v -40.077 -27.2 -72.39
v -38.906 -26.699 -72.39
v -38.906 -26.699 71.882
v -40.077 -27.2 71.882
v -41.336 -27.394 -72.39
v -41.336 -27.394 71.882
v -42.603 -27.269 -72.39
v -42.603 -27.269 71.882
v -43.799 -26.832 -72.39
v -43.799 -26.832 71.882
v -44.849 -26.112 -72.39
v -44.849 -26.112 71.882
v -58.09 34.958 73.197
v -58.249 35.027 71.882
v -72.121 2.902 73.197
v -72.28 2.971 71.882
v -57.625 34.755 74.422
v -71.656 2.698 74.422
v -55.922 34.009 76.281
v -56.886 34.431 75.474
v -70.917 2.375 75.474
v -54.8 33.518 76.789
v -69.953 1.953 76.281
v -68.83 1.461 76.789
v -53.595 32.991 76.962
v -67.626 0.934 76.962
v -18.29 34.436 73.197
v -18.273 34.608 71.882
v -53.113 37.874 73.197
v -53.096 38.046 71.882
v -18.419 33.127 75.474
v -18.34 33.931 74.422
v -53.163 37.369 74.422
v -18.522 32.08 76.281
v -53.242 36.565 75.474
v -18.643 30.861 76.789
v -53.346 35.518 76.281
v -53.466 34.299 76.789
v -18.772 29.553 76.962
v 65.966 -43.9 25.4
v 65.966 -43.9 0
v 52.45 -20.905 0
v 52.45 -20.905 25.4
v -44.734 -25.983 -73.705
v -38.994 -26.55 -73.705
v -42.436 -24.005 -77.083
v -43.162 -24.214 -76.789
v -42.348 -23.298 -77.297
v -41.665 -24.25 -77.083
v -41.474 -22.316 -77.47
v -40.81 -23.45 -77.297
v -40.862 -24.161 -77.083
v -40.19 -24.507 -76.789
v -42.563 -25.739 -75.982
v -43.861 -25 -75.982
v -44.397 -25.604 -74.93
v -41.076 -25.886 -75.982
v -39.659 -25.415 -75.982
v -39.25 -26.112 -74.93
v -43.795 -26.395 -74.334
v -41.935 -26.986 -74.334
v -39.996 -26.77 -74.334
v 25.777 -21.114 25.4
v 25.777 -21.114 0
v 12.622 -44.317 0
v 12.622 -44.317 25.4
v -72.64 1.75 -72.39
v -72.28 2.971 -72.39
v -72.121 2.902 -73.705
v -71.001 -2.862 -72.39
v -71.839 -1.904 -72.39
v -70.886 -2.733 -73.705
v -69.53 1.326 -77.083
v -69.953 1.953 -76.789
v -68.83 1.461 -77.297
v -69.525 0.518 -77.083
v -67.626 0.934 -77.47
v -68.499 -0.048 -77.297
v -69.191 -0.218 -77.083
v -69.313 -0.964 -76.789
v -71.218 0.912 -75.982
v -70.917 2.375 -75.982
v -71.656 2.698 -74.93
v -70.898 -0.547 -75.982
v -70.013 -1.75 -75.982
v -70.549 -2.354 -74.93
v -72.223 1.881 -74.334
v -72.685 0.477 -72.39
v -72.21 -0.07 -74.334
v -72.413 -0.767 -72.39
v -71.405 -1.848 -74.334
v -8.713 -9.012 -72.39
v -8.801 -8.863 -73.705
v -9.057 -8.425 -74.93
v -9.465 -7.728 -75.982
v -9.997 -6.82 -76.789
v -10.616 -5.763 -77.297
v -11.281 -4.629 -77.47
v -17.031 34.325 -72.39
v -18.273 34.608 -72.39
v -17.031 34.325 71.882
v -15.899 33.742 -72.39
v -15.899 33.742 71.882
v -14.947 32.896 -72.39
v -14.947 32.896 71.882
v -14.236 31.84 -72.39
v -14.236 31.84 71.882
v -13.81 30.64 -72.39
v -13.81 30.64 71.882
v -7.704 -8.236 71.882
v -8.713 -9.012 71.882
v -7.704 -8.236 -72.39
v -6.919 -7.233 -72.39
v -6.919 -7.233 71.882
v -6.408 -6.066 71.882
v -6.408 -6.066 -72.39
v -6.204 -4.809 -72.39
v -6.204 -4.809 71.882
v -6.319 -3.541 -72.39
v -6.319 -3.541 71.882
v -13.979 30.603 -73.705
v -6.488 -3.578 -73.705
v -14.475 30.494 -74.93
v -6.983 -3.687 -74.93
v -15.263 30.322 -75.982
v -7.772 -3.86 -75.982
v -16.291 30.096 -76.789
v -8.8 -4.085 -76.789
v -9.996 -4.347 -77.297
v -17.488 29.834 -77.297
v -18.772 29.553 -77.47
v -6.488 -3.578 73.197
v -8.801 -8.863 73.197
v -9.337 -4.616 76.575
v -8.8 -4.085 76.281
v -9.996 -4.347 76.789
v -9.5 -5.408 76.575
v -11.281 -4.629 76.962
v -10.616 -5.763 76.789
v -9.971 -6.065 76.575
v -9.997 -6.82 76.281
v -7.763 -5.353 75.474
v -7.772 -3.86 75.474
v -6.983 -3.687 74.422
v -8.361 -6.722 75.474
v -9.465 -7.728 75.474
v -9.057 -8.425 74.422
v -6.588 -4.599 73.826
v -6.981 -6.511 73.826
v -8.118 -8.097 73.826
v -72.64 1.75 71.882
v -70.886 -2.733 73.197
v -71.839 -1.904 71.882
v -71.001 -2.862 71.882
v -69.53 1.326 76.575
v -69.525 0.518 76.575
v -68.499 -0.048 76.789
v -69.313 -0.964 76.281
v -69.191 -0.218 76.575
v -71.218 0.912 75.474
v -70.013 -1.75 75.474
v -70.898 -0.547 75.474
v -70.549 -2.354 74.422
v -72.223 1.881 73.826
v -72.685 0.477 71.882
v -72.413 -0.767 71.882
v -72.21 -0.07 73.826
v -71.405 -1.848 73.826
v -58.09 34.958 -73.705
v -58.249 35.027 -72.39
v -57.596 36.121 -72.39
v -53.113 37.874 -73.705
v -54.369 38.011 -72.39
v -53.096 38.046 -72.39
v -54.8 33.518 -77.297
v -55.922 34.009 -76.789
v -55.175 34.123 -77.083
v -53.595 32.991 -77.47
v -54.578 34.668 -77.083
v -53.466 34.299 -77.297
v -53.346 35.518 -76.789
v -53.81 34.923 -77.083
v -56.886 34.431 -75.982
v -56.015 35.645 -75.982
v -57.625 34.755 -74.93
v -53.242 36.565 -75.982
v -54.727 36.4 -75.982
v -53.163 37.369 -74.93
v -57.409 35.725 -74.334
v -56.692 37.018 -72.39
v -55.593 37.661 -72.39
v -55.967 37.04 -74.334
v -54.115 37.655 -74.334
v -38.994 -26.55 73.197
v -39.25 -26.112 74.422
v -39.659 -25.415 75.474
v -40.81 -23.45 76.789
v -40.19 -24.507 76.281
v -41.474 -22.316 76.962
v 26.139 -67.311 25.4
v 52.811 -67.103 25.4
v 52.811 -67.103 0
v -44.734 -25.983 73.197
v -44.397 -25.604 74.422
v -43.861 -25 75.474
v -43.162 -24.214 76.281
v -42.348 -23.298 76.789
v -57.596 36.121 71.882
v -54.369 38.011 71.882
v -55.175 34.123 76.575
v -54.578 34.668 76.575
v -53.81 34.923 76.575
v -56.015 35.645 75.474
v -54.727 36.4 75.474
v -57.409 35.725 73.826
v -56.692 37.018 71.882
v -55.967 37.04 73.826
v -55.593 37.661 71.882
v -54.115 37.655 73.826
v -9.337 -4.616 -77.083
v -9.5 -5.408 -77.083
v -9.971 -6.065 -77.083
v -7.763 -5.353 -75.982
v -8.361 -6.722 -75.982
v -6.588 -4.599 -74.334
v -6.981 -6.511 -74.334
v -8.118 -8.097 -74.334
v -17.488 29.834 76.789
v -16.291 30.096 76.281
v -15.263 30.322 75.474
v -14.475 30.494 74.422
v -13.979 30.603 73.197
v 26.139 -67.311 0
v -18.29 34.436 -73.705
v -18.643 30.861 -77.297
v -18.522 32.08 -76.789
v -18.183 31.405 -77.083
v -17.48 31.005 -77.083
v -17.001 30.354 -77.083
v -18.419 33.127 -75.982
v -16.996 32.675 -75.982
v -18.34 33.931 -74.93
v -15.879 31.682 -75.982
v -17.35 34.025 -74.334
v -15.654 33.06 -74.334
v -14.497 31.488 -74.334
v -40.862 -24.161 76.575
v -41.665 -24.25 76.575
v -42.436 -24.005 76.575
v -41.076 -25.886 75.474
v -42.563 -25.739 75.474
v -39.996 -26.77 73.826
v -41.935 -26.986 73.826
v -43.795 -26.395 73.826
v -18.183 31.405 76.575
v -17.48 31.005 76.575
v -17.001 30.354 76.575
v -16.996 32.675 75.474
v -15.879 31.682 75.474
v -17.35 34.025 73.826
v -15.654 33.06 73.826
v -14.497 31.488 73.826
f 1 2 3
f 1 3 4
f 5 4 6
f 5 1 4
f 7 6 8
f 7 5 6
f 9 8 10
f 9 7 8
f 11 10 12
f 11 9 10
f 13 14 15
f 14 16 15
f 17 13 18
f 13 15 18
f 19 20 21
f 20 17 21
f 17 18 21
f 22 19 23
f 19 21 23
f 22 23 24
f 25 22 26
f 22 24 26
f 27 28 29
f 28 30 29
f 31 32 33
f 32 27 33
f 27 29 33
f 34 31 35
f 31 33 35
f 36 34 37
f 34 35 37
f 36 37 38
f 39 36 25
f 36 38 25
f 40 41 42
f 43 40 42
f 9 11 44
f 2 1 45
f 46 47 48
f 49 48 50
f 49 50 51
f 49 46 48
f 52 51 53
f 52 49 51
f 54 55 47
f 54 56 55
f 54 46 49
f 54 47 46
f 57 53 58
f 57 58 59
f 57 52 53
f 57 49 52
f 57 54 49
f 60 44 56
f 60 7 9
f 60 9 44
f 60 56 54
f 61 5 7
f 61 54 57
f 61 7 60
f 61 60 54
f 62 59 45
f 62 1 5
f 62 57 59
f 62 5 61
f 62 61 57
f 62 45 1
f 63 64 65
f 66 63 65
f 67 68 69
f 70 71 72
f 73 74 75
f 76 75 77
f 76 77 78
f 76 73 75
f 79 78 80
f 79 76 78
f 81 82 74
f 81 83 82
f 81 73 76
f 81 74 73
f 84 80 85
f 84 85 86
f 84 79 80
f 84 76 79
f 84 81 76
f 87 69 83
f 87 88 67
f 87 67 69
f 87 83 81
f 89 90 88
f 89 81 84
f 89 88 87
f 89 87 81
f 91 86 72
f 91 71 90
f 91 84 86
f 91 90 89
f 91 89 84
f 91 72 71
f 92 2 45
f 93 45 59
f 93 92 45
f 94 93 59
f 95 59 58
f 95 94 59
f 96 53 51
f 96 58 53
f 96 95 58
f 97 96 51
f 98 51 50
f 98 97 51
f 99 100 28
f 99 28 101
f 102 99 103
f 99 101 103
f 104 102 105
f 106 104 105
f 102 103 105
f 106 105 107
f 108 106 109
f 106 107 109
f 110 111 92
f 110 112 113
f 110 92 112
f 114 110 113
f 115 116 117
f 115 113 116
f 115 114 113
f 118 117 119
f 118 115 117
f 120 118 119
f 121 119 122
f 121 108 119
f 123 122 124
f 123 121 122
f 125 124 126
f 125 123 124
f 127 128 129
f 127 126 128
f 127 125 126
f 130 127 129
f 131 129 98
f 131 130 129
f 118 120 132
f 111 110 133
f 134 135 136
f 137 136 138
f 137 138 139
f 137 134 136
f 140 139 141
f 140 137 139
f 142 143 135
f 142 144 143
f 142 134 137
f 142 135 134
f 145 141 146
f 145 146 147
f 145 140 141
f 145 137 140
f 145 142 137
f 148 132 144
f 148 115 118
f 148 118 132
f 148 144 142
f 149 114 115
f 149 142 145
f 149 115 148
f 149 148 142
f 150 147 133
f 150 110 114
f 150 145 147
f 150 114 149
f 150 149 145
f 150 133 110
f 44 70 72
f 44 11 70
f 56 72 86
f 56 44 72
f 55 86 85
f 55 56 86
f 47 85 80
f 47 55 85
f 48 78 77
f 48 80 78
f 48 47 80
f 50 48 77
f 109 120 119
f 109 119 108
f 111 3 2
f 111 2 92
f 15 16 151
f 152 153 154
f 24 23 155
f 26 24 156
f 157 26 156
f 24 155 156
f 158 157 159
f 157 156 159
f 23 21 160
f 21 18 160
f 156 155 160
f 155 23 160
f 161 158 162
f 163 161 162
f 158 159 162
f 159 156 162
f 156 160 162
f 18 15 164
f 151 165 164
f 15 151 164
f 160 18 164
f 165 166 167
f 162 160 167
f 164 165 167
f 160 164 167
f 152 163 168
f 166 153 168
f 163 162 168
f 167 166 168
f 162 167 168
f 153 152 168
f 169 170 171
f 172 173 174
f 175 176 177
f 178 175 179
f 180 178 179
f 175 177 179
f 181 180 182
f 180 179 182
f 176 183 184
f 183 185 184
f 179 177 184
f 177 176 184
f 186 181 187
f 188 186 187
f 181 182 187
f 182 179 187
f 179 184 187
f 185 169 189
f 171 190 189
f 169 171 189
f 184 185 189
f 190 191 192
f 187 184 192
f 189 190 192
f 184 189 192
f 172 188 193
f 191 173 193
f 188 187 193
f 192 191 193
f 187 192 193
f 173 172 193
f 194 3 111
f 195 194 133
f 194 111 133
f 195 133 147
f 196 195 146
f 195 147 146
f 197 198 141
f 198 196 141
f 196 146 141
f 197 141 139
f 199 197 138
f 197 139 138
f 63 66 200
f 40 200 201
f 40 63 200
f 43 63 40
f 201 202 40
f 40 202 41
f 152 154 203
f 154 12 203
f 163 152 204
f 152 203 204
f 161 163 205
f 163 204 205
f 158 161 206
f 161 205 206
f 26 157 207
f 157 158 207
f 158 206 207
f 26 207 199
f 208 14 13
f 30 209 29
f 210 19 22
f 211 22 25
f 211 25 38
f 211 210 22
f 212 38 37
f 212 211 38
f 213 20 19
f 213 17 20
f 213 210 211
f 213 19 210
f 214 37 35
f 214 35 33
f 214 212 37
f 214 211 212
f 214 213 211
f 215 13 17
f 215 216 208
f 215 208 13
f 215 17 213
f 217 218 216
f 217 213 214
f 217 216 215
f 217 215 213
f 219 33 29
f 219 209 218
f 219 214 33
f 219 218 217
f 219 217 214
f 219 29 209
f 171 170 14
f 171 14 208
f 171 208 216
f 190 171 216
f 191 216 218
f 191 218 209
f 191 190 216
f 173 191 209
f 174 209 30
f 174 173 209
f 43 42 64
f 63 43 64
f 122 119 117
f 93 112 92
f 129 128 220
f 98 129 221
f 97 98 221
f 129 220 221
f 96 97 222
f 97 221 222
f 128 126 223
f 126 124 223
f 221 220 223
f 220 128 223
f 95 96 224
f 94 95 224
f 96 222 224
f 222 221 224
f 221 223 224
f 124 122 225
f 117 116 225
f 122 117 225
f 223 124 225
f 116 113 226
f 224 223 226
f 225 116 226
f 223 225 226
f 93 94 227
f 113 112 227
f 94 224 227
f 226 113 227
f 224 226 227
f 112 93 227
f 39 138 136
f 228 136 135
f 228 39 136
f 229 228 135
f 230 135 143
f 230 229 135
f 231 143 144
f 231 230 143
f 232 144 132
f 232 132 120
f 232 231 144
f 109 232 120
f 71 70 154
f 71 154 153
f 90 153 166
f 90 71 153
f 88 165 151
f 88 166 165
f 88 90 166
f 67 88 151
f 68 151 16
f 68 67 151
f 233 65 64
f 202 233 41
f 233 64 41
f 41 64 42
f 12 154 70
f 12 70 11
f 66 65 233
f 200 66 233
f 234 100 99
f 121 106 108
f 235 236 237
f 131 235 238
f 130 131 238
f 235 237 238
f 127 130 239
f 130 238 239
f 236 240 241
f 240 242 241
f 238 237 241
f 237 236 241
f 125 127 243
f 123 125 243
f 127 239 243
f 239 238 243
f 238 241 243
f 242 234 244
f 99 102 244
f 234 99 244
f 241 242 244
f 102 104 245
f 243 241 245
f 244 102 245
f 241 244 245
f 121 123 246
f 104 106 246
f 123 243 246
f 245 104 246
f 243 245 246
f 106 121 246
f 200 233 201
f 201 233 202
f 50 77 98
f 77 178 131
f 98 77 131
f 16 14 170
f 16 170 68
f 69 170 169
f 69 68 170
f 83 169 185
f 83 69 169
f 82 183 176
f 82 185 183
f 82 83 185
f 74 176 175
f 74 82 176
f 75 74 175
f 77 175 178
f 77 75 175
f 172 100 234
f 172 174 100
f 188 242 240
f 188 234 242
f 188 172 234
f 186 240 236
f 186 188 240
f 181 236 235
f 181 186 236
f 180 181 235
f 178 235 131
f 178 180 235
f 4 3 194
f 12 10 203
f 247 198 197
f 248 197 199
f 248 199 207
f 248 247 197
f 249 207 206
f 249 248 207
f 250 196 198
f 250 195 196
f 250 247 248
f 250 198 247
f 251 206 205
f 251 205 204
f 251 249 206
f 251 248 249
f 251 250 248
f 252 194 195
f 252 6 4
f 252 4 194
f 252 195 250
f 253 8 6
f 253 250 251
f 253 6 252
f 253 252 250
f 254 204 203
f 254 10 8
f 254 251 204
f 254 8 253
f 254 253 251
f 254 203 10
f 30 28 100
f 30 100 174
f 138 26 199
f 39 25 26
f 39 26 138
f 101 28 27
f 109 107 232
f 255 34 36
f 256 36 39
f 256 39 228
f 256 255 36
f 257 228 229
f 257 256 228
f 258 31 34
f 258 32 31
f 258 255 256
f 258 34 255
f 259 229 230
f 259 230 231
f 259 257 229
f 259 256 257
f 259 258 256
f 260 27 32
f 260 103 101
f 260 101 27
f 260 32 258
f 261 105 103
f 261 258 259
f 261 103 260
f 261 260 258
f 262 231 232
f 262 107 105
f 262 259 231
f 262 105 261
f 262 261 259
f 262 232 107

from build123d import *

# Parameters (mm, degrees)
F1_DEPTH      = 76.962
F1_DEPTH_BACK = 77.47
F2_R          = 5.08
F4_DEPTH      = 25.4
F5_DEPTH      = 25.4


with BuildPart() as f1:
    # F0 (on Top) → F1 (new body, two sides)
    with BuildSketch(Plane.XY) as f1_sk:
        Polygon((-42.091104, -28.56459), (-5.52844, -7.146423), (-14.599843, 34.245315), (-56.768942, 38.408649), (-73.759476, -0.410007), align=None)
    extrude(amount=F1_DEPTH)
    extrude(f1_sk.sketch, amount=-F1_DEPTH_BACK)

    # F2
    f2_edges = [f1.edges().sort_by_distance(p)[0] for p in [
        (-57.92529, -14.487299, 76.962),
        (-42.091104, -28.56459, -0.254),
        (-57.92529, -14.487299, -77.47),
        (-73.759476, -0.410007, -0.254),
        (-56.768942, 38.408649, -0.254),
        (-65.264209, 18.999321, 76.962),
        (-65.264209, 18.999321, -77.47),
        (-14.599843, 34.245315, -0.254),
        (-35.684392, 36.326982, 76.962),
        (-35.684392, 36.326982, -77.47),
        (-5.52844, -7.146423, -0.254),
        (-10.064141, 13.549446, 76.962),
        (-10.064141, 13.549446, -77.47),
        (-23.809772, -17.855506, 76.962),
        (-23.809772, -17.855506, -77.47),
    ]]
    fillet(f2_edges, radius=F2_R)


with BuildPart() as f4:
    # F3 (on Top) → F4 (new body)
    with BuildSketch(Plane.XY):
        Polygon((26.138879, -67.311302), (52.810986, -67.102656), (65.966346, -43.89961), (52.4496, -20.905211), (25.777493, -21.113858), (12.622132, -44.316903), align=None)
    extrude(amount=F4_DEPTH)

    # F3 (on Top) → F5 (join)
    with BuildSketch(Plane.XY):
        Polygon((26.138879, -67.311302), (52.810986, -67.102656), (65.966346, -43.89961), (52.4496, -20.905211), (25.777493, -21.113858), (12.622132, -44.316903), align=None)
    extrude(amount=F5_DEPTH)


solid = Compound([f1.part, f4.part])
